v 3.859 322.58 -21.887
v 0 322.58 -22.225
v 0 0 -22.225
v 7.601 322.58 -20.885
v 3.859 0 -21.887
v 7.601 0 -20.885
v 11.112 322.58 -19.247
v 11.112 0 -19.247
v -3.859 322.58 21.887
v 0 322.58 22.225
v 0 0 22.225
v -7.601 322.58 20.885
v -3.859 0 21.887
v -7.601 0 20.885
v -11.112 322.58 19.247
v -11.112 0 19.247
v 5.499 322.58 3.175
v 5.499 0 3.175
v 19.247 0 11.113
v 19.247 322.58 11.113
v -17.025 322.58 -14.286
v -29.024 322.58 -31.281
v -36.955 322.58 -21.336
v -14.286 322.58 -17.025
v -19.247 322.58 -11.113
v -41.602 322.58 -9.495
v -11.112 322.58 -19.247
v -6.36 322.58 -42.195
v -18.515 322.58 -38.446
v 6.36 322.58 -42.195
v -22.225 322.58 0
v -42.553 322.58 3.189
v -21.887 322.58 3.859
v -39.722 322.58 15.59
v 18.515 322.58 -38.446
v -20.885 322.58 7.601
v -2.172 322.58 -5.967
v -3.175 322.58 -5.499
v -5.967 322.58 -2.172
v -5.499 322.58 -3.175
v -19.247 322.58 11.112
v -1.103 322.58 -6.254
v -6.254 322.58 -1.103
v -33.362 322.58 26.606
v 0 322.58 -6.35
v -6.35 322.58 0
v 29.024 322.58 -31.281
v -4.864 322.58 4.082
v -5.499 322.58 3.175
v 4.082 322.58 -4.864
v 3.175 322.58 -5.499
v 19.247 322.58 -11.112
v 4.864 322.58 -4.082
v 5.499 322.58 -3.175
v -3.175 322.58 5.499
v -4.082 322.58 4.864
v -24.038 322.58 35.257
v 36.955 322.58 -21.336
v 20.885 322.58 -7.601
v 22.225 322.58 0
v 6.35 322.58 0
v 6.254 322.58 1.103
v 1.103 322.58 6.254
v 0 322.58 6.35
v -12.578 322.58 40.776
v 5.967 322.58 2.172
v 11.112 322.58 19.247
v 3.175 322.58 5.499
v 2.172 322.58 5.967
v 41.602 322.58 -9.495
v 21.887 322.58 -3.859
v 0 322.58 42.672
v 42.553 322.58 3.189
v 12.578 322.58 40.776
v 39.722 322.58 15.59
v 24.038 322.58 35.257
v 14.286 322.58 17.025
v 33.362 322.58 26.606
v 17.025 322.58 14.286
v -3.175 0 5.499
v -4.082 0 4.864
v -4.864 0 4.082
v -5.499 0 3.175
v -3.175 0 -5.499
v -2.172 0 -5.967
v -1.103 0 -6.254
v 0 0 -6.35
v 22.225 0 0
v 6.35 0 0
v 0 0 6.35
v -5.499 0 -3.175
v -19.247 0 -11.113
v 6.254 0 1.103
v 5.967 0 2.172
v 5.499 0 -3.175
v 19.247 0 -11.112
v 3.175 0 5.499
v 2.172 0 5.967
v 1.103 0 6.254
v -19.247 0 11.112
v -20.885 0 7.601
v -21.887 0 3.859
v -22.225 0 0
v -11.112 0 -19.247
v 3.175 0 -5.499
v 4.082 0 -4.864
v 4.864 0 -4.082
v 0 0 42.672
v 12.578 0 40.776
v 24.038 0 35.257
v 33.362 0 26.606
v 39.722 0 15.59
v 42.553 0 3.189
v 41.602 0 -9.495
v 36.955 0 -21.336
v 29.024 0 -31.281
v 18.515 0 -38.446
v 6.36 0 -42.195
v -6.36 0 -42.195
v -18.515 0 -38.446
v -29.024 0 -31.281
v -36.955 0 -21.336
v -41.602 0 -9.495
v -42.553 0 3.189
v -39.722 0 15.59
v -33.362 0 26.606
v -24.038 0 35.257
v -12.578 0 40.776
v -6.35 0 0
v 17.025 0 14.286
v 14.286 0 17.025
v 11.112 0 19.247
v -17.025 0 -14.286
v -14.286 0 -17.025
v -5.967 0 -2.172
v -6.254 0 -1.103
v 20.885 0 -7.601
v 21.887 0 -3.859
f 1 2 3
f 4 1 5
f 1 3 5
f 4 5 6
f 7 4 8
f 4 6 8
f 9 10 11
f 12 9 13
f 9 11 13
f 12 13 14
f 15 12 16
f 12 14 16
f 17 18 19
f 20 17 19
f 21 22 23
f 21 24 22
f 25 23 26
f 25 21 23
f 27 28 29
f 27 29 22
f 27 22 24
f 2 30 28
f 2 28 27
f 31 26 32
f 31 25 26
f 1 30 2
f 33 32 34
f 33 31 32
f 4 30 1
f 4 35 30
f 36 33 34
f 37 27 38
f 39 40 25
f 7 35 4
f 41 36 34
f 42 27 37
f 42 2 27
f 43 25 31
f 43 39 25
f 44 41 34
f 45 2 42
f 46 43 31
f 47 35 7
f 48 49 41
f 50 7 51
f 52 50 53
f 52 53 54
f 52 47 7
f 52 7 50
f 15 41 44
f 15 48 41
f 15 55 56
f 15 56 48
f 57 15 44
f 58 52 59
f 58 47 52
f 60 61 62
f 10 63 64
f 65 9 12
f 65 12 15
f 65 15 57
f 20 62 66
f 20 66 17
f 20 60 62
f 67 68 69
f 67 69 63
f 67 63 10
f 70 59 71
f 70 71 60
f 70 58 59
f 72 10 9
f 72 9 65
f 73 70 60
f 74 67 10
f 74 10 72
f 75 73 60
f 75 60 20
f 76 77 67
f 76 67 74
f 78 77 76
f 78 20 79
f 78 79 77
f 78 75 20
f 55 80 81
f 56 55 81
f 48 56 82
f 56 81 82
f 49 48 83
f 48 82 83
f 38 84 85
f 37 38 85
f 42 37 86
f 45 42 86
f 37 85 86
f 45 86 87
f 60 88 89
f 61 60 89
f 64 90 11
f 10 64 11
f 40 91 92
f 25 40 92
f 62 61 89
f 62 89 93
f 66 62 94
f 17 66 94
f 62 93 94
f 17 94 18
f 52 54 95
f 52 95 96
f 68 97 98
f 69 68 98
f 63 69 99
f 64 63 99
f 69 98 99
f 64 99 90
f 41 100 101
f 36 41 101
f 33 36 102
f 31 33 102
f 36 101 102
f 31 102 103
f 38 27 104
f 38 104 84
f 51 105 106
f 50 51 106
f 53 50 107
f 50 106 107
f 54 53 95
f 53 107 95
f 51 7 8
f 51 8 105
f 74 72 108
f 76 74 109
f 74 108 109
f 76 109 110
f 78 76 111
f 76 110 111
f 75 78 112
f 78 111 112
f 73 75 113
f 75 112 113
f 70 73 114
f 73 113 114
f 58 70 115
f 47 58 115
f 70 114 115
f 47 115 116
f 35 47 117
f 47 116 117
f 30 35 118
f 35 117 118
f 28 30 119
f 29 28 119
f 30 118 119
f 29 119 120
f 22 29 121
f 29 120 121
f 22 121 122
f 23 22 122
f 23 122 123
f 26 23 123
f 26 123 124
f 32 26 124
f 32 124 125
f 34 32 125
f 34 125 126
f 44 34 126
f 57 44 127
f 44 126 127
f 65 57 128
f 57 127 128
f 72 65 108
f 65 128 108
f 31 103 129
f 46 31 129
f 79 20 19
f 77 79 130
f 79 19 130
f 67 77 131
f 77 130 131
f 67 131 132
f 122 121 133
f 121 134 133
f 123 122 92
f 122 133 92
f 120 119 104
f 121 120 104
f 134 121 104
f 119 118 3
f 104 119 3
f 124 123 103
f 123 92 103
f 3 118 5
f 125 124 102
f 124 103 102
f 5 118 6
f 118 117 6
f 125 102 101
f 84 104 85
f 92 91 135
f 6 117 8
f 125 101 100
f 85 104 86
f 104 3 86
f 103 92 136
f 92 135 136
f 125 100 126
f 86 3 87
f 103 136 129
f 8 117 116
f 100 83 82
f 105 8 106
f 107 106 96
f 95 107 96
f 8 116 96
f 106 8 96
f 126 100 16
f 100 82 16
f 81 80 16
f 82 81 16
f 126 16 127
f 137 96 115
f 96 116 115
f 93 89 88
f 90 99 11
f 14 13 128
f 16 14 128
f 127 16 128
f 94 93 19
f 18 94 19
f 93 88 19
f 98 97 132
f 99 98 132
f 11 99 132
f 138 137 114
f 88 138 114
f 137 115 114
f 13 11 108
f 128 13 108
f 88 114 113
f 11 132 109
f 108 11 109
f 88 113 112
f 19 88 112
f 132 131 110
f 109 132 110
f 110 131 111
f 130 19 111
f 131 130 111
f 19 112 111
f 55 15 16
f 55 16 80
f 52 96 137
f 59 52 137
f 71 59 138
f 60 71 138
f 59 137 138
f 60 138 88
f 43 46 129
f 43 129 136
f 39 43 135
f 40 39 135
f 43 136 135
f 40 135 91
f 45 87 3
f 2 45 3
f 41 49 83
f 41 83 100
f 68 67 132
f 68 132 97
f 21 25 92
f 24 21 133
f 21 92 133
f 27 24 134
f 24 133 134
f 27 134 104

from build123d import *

# Parameters (mm, degrees)
SKETCH1_R           = 42.672
BOSS_EXTRUDE1_DEPTH = 322.58


with BuildPart() as part:
    # Sketch1 → Boss-Extrude1 (new body)
    with BuildSketch(Plane(origin=(0, 0, 0), x_dir=(1, 0, 0), z_dir=(0, 1, 0))):
        with Locations(Location((0, 0, 0), (0, 0, 270))):
            Circle(SKETCH1_R)
        with BuildLine():
            Line((0, 6.35), (0, 22.225))
            ThreePointArc((0, 22.225), (5.752253277, 21.467701489), (11.1125, 19.247414599))
            Line((11.1125, 19.247414599), (3.175, 5.499261314))
            ThreePointArc((3.175, 5.499261314), (4.490128061, 4.490128061), (5.499261314, 3.175))
            Line((5.499261314, 3.175), (19.247414599, 11.1125))
            ThreePointArc((19.247414599, 11.1125), (21.467701489, 5.752253277), (22.225, 0))
            Line((22.225, 0), (6.35, 0))
            ThreePointArc((6.35, 0), (6.133628997, -1.643500936), (5.499261314, -3.175))
            Line((5.499261314, -3.175), (19.247414599, -11.1125))
            ThreePointArc((19.247414599, -11.1125), (15.715448212, -15.715448212), (11.1125, -19.247414599))
            Line((11.1125, -19.247414599), (3.175, -5.499261314))
            ThreePointArc((3.175, -5.499261314), (1.643500936, -6.133628997), (0, -6.35))
            Line((0, -6.35), (0, -22.225))
            ThreePointArc((0, -22.225), (-5.752253277, -21.467701489), (-11.1125, -19.247414599))
            Line((-11.1125, -19.247414599), (-3.175, -5.499261314))
            ThreePointArc((-3.175, -5.499261314), (-4.490128061, -4.490128061), (-5.499261314, -3.175))
            Line((-5.499261314, -3.175), (-19.247414599, -11.1125))
            ThreePointArc((-19.247414599, -11.1125), (-21.467701489, -5.752253277), (-22.225, 0))
            Line((-22.225, 0), (-6.35, 0))
            ThreePointArc((-6.35, 0), (-6.133628997, 1.643500936), (-5.499261314, 3.175))
            Line((-5.499261314, 3.175), (-19.247414599, 11.1125))
            ThreePointArc((-19.247414599, 11.1125), (-15.715448212, 15.715448212), (-11.1125, 19.247414599))
            Line((-11.1125, 19.247414599), (-3.175, 5.499261314))
            ThreePointArc((-3.175, 5.499261314), (-1.643500936, 6.133628997), (0, 6.35))
        make_face(mode=Mode.SUBTRACT)
    extrude(amount=BOSS_EXTRUDE1_DEPTH)


solid = part.part
